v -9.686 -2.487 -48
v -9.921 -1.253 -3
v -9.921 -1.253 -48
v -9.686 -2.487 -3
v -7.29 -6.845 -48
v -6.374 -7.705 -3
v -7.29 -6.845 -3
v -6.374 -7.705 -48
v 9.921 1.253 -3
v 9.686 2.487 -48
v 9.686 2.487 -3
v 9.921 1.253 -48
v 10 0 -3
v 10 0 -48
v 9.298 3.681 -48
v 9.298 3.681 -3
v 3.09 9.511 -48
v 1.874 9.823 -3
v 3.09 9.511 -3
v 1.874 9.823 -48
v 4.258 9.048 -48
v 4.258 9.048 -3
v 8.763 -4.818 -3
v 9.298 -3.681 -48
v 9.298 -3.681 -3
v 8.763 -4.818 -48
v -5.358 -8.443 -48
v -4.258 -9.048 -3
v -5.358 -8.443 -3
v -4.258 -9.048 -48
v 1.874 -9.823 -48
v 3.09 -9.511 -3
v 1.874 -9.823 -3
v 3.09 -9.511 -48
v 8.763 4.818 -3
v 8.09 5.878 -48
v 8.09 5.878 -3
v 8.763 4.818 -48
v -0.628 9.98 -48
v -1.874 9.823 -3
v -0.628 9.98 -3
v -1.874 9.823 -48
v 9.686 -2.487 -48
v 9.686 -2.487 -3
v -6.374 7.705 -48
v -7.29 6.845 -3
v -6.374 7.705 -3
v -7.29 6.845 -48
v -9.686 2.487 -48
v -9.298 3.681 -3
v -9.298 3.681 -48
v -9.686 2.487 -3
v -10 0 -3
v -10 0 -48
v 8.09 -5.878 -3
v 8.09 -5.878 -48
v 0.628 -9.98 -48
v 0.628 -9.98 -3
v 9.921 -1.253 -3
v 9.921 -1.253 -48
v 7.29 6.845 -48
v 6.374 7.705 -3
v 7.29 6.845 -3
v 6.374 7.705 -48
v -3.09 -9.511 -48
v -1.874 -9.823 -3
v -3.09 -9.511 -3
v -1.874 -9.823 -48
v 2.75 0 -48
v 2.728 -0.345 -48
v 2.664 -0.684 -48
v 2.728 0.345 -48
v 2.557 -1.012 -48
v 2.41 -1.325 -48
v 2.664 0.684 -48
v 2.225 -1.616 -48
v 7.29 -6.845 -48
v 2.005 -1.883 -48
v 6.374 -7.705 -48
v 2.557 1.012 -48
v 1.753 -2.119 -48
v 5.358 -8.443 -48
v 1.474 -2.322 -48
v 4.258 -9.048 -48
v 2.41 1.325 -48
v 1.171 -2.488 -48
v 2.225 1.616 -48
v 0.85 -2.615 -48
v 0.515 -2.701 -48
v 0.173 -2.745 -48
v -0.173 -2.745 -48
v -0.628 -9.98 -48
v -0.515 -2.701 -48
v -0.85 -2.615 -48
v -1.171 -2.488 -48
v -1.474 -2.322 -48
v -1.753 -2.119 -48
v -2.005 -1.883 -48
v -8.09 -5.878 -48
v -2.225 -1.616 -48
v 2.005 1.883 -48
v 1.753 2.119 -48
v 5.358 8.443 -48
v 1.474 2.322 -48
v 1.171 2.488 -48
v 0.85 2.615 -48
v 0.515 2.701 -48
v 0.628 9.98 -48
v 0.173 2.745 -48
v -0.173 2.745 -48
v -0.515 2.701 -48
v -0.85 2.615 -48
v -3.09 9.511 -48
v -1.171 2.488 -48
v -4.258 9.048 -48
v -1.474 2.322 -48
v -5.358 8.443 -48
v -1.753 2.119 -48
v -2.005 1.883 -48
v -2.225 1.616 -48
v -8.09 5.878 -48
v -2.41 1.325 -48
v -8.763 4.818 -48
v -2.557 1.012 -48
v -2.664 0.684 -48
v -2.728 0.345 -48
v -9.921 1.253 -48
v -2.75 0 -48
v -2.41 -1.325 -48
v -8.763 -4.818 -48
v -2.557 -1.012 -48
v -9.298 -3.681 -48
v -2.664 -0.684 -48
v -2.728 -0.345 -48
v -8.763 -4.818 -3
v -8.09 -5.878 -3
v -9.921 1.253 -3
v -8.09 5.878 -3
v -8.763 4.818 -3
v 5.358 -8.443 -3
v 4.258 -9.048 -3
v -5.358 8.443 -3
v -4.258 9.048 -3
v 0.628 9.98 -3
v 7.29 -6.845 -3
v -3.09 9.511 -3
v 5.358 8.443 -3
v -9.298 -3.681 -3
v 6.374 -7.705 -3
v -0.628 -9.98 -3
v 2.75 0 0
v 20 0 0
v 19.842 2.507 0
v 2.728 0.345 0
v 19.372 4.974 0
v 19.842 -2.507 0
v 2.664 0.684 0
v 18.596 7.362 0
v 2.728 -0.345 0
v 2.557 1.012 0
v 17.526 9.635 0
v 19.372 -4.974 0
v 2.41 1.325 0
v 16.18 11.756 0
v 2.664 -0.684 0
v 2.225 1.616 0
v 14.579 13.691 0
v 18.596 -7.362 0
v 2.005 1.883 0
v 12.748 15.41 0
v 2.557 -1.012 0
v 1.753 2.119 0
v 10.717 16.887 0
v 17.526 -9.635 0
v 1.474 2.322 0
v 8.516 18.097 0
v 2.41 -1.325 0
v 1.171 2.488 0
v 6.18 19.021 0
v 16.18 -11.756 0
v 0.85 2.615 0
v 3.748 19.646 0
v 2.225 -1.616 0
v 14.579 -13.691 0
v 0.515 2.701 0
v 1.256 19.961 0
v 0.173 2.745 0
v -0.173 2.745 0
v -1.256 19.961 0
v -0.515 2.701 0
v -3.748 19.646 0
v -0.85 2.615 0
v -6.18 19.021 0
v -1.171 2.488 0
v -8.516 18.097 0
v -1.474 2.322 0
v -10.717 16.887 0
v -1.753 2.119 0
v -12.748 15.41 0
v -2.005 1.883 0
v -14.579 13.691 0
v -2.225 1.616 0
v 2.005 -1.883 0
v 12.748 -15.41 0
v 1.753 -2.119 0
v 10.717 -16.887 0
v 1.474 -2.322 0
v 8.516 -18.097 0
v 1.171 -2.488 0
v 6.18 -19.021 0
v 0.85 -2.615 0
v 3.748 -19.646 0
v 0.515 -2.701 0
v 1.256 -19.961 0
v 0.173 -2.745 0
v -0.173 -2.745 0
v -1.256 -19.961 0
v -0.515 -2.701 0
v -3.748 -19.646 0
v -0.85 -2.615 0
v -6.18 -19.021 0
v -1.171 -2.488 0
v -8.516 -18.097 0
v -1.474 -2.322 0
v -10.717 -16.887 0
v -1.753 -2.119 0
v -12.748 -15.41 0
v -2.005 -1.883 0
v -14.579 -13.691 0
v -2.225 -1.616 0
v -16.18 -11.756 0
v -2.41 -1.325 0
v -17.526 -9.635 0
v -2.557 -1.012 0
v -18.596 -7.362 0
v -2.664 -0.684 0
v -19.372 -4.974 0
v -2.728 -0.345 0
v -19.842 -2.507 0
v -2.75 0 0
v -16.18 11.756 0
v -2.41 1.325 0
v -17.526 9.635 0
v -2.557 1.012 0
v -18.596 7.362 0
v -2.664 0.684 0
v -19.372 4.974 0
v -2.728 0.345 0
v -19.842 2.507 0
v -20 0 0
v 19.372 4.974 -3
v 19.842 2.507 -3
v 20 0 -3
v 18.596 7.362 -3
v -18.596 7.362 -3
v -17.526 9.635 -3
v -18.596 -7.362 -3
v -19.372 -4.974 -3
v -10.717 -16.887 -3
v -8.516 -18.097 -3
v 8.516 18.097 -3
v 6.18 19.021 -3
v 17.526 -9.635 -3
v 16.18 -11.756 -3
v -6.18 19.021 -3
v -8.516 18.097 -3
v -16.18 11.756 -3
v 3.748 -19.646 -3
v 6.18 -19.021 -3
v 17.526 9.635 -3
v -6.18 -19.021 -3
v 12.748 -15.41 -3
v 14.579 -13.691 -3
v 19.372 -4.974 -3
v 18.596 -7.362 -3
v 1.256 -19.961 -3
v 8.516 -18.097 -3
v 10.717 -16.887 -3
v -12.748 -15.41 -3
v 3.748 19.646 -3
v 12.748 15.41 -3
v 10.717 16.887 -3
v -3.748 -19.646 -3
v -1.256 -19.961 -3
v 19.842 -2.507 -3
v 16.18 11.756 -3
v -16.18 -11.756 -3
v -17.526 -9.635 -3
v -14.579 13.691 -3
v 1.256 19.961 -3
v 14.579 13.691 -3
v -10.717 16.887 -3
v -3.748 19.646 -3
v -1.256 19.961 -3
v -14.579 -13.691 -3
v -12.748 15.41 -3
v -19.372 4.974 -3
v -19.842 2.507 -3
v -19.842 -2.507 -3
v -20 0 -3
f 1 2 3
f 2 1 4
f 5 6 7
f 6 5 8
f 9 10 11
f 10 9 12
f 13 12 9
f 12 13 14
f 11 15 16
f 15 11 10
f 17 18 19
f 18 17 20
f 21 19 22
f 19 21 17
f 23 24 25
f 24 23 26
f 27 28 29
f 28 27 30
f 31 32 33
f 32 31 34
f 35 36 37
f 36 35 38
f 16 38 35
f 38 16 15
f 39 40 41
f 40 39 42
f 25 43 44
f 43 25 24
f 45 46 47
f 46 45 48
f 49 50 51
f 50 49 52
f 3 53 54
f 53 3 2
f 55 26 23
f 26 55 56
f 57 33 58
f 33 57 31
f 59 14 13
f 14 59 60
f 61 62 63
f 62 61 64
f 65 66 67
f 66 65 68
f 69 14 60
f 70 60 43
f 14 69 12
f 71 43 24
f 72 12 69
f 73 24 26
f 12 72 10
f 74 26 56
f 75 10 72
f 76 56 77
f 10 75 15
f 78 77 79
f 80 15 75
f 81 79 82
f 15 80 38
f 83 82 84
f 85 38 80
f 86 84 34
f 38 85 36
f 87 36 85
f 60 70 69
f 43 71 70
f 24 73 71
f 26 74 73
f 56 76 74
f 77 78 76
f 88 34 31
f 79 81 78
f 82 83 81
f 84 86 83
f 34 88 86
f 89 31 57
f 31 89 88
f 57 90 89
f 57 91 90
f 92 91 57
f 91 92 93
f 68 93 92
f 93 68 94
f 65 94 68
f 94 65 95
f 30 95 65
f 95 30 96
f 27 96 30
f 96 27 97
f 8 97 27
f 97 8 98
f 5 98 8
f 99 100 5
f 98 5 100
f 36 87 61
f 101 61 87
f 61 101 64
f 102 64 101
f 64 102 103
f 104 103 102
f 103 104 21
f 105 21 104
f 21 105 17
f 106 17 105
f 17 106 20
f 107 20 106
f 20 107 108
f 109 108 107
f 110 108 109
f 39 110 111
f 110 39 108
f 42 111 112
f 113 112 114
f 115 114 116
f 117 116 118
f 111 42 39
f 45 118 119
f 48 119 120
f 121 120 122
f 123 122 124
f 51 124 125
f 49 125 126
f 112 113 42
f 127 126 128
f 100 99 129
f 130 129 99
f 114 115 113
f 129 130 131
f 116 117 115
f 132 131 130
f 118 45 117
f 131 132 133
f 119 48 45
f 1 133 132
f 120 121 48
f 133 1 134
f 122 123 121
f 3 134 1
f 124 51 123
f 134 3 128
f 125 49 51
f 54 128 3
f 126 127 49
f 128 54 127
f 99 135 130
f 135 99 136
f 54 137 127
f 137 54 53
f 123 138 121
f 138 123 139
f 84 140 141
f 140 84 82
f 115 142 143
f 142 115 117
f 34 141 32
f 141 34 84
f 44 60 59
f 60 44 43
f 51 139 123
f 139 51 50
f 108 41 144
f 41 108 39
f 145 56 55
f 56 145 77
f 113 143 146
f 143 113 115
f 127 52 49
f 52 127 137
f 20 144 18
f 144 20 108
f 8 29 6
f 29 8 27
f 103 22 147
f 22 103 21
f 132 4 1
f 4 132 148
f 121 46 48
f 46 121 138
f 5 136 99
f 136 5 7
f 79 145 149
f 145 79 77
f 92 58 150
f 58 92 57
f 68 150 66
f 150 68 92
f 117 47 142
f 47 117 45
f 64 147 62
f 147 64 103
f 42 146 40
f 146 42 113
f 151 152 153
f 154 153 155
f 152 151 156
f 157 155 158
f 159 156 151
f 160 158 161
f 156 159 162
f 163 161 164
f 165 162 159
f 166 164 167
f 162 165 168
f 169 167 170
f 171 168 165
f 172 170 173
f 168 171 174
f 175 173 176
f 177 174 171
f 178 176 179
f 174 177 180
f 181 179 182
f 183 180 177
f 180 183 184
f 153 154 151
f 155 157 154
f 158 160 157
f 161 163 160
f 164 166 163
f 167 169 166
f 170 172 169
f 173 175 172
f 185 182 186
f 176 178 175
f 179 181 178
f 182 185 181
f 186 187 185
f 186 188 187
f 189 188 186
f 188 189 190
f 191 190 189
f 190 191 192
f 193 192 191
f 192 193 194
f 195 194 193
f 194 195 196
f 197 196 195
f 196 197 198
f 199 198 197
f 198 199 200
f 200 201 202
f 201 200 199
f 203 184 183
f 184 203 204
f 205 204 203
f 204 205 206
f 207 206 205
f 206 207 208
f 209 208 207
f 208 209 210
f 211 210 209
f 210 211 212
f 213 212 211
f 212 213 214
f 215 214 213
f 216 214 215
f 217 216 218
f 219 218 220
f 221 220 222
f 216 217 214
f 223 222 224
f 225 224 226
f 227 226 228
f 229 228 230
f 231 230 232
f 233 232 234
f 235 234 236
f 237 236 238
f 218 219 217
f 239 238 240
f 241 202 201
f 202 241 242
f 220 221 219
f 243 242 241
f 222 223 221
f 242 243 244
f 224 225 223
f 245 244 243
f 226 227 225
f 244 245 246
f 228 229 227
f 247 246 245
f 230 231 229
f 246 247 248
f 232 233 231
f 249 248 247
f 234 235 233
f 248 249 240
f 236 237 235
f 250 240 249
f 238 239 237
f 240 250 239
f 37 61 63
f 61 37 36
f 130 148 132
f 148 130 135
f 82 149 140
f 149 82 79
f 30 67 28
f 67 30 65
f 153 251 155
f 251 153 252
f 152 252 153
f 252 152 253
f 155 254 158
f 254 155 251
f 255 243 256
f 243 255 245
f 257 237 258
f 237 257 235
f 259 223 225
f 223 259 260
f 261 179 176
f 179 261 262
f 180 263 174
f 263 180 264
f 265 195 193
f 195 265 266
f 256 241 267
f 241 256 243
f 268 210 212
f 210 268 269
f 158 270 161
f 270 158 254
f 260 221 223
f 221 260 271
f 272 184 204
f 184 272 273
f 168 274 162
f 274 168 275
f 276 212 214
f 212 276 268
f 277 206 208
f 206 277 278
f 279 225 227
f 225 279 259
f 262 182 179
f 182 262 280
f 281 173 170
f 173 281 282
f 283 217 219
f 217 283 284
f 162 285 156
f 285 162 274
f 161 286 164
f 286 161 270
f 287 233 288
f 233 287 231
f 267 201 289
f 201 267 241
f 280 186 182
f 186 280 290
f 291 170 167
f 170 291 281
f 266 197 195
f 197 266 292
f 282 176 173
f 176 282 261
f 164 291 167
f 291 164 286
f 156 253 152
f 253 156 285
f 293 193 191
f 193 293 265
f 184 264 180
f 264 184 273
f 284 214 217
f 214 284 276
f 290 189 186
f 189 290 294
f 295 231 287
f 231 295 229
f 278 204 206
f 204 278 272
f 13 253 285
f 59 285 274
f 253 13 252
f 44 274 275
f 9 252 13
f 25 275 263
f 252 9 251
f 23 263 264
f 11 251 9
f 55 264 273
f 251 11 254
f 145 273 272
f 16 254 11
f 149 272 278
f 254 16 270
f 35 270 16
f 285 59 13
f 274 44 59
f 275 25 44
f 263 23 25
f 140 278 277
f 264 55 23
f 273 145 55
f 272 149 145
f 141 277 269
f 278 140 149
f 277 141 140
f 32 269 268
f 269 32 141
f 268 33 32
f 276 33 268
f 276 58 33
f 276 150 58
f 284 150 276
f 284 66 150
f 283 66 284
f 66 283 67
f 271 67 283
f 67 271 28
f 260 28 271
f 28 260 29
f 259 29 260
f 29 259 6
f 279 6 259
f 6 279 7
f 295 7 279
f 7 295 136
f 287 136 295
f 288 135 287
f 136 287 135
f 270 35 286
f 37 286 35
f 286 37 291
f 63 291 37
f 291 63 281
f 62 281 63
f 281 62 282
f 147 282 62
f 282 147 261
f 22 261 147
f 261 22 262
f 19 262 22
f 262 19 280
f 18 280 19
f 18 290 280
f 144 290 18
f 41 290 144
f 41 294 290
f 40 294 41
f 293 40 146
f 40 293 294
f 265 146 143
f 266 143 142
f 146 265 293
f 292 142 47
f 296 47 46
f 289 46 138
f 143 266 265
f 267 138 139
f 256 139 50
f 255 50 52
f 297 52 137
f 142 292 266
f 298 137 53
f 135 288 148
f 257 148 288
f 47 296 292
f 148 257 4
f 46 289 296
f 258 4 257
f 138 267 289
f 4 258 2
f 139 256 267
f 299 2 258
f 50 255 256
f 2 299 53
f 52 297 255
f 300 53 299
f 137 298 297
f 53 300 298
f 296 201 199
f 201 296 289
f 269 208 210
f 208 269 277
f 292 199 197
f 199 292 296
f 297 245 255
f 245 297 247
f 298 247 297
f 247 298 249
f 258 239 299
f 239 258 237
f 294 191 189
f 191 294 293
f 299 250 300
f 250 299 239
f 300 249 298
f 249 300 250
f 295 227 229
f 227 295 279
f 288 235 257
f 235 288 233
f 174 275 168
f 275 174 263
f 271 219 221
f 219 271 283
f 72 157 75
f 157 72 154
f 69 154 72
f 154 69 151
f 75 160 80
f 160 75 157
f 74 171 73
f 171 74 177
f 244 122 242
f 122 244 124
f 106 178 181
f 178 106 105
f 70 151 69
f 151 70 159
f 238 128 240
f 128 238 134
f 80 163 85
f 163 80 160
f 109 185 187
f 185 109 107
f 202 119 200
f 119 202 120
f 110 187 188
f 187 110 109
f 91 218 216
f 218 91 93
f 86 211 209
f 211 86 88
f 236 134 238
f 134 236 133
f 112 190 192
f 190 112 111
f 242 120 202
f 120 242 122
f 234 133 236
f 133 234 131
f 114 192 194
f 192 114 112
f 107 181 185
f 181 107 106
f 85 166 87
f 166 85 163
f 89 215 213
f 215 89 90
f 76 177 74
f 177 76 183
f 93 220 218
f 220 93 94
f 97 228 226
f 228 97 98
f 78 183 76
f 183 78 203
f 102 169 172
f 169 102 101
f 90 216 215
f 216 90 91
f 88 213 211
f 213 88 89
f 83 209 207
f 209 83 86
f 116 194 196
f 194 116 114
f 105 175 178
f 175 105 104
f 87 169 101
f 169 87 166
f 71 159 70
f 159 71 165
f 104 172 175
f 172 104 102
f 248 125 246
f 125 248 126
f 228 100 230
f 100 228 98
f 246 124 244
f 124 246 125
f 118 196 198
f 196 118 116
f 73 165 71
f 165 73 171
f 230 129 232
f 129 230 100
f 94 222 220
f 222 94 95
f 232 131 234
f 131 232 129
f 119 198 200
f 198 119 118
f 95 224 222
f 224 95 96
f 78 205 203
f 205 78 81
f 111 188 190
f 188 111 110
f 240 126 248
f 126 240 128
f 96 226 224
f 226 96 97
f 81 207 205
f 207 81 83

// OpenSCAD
$fn = 50;


difference() {
	union() {
		translate(v = [0, 0, -48.0000000000]) {
			cylinder(h = 48, r = 10.0000000000);
		}
		translate(v = [0, 0, -3.0000000000]) {
			cylinder(h = 3, r = 20.0000000000);
		}
	}
	union() {
		#translate(v = [0, 0, -48]) {
			cylinder(h = 48, r = 2.7500000000);
		}
	}
}
